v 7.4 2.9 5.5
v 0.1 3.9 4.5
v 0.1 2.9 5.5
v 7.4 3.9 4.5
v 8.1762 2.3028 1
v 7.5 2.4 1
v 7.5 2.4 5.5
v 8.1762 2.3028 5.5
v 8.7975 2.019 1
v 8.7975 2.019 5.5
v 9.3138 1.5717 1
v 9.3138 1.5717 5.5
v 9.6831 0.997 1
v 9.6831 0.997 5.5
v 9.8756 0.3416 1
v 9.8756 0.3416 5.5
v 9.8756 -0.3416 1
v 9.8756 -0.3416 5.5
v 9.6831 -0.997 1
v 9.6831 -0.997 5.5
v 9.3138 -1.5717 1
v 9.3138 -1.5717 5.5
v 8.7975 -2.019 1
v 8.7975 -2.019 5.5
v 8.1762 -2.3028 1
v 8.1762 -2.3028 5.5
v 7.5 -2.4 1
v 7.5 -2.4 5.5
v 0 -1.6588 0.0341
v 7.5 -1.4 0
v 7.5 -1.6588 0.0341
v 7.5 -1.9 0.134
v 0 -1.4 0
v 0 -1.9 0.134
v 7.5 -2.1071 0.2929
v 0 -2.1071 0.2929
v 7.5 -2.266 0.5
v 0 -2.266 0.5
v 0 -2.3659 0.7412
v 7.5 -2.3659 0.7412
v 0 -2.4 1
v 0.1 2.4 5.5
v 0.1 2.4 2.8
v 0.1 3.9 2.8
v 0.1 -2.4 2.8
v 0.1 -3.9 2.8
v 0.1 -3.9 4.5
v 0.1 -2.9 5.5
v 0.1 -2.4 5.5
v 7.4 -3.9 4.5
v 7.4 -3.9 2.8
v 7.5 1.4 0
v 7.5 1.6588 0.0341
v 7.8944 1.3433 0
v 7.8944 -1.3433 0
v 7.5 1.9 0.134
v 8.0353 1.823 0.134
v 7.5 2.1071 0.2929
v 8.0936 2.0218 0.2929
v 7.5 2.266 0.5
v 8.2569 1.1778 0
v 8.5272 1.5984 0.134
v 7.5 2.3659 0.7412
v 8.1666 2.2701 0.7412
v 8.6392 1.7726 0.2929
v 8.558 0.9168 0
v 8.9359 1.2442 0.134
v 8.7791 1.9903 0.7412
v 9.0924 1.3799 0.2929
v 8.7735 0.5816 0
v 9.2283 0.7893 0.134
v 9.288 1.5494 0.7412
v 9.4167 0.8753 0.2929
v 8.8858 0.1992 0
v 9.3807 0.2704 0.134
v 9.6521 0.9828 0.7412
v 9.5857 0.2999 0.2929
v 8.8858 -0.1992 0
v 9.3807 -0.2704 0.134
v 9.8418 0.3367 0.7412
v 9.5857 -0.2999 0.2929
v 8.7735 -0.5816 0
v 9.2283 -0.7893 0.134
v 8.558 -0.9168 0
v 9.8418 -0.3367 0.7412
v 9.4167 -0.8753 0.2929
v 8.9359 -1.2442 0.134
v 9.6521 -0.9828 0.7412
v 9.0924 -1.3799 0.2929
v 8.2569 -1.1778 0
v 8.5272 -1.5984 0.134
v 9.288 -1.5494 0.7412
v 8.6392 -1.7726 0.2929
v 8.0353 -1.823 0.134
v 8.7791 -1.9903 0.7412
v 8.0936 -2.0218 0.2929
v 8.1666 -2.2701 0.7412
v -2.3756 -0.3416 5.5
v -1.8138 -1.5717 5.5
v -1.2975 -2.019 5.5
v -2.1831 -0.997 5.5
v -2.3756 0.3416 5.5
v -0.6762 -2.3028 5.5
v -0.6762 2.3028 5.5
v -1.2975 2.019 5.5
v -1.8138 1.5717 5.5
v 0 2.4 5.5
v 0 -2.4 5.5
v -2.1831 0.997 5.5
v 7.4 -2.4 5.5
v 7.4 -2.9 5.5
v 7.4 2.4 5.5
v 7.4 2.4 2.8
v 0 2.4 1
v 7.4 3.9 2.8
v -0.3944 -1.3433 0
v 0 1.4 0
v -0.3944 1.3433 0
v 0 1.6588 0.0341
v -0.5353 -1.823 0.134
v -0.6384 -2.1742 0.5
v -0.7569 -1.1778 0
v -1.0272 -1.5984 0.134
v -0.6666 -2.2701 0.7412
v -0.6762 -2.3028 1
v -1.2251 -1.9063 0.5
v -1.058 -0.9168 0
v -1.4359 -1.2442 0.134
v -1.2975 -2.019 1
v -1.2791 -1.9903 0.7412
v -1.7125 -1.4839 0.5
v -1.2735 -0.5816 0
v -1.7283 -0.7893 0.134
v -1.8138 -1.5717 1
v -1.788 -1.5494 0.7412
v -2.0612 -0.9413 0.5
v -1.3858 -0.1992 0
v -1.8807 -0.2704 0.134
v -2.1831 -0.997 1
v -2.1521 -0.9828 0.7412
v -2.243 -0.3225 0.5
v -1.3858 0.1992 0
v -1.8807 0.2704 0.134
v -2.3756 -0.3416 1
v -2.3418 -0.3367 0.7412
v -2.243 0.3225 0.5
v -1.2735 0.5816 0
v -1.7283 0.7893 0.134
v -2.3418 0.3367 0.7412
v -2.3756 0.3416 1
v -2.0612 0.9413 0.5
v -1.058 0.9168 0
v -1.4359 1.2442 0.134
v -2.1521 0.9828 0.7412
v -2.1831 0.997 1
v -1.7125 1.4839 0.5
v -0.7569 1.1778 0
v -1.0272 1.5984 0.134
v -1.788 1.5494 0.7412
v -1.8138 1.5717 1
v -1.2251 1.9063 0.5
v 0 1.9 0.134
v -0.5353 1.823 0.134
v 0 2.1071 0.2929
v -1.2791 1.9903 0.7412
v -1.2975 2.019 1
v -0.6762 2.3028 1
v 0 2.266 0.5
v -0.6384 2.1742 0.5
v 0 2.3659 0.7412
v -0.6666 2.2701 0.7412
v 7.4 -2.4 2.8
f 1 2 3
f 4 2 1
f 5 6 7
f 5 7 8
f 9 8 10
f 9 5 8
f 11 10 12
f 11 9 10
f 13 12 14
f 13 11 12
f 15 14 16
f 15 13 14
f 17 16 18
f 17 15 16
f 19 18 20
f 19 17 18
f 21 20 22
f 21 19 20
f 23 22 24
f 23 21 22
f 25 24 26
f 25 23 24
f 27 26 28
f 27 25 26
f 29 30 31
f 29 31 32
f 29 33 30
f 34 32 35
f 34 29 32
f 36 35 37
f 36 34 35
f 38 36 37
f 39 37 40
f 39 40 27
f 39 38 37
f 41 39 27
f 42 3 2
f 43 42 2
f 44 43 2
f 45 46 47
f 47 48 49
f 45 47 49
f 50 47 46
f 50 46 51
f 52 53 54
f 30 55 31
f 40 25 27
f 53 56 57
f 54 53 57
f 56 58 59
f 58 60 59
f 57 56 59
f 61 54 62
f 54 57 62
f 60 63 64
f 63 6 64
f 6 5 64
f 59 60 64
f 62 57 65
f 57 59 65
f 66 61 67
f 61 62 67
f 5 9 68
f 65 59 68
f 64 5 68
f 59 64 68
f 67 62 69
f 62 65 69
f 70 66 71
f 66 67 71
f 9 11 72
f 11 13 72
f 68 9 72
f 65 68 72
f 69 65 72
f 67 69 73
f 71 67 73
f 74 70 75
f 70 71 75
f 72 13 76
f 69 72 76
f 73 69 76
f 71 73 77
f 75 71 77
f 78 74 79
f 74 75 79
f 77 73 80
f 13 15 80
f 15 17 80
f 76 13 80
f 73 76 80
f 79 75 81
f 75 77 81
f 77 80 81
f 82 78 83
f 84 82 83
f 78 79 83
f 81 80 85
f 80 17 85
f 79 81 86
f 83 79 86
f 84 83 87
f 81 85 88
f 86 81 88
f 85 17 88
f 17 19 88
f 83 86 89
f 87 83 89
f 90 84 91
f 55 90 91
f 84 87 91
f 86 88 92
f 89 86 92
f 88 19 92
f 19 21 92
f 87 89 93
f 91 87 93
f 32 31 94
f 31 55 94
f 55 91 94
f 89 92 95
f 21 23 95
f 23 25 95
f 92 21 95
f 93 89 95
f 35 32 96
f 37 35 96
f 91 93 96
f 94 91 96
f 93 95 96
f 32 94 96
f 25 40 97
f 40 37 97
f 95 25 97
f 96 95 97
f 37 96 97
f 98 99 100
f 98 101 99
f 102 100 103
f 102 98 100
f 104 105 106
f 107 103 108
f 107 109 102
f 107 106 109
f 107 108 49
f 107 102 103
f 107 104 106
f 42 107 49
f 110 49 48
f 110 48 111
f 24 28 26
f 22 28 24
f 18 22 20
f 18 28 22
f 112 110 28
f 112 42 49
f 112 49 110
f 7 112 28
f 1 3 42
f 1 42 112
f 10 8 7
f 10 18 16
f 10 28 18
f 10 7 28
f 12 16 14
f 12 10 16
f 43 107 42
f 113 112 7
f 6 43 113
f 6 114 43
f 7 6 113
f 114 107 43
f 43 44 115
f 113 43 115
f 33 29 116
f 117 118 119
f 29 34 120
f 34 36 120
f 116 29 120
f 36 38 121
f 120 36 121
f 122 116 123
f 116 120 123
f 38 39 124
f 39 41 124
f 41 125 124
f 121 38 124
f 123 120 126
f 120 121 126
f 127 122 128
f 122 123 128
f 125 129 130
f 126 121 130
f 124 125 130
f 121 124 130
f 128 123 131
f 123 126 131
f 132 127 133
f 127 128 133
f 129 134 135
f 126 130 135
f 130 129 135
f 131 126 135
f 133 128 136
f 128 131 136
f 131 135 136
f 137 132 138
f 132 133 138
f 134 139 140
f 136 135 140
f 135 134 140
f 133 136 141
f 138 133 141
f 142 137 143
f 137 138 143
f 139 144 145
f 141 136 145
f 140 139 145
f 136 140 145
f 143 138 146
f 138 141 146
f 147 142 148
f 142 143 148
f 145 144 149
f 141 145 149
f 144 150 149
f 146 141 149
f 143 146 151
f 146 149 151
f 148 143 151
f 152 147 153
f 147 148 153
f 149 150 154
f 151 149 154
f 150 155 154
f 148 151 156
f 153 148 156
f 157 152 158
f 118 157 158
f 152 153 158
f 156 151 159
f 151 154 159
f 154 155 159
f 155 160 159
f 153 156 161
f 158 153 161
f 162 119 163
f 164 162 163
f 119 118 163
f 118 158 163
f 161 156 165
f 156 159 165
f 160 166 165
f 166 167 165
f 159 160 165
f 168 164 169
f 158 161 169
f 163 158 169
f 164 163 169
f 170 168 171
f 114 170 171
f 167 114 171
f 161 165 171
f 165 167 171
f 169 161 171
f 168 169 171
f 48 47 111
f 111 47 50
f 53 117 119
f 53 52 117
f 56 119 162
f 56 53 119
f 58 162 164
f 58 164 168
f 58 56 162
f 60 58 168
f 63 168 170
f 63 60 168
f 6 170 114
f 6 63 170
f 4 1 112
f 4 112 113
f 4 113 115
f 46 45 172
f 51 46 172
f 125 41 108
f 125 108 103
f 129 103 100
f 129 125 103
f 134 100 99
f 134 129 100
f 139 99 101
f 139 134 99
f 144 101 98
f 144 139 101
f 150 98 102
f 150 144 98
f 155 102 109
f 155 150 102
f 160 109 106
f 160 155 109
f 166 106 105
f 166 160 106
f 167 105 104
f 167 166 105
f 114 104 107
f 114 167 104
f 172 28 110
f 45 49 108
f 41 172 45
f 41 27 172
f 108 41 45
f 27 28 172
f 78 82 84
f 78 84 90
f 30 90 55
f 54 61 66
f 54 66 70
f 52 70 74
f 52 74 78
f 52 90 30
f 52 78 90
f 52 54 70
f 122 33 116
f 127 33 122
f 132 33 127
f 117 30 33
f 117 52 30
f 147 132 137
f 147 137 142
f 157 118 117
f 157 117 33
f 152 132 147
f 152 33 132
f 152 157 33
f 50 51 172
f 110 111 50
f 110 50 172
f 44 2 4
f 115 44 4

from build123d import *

# Parameters (mm, degrees)
EXTRUDE_1_DEPTH = 5.5
SKETCH_2_W      = 7.3
SKETCH_2_H      = 7.8
EXTRUDE_2_DEPTH = 2.7
FILLET_1_R      = 1
CHAMFER_1_SIZE  = 1


with BuildPart() as part:
    # Эскиз1 → Бобышка-Вытянуть1 (new body)
    with BuildSketch(Plane.XY):
        with BuildLine():
            Line((0, 2.4), (7.5, 2.4))
            ThreePointArc((7.5, 2.4), (9.9, 0), (7.5, -2.4))
            Line((7.5, -2.4), (0, -2.4))
            ThreePointArc((0, -2.4), (-2.4, 0), (0, 2.4))
        make_face()
    extrude(amount=EXTRUDE_1_DEPTH)

    # Эскиз2 → Бобышка-Вытянуть2 (add)
    with BuildSketch(Plane.XY.offset(5.5)):
        with Locations((3.75, 0)):
            Rectangle(SKETCH_2_W, SKETCH_2_H)
    extrude(amount=-EXTRUDE_2_DEPTH)

    # Скругление1
    fillet_1_edges = [part.edges().sort_by_distance(p)[0] for p in [
        (3.75, 2.4, 0),
        (9.9, 0, 0),
        (3.75, -2.4, 0),
        (-2.4, 0, 0),
    ]]
    fillet(fillet_1_edges, radius=FILLET_1_R)

    # Фаска1
    chamfer_1_edges = [part.edges().sort_by_distance(p)[0] for p in [
        (3.75, -3.9, 5.5),
        (3.75, 3.9, 5.5),
    ]]
    chamfer(chamfer_1_edges, length=CHAMFER_1_SIZE)


solid = part.part
